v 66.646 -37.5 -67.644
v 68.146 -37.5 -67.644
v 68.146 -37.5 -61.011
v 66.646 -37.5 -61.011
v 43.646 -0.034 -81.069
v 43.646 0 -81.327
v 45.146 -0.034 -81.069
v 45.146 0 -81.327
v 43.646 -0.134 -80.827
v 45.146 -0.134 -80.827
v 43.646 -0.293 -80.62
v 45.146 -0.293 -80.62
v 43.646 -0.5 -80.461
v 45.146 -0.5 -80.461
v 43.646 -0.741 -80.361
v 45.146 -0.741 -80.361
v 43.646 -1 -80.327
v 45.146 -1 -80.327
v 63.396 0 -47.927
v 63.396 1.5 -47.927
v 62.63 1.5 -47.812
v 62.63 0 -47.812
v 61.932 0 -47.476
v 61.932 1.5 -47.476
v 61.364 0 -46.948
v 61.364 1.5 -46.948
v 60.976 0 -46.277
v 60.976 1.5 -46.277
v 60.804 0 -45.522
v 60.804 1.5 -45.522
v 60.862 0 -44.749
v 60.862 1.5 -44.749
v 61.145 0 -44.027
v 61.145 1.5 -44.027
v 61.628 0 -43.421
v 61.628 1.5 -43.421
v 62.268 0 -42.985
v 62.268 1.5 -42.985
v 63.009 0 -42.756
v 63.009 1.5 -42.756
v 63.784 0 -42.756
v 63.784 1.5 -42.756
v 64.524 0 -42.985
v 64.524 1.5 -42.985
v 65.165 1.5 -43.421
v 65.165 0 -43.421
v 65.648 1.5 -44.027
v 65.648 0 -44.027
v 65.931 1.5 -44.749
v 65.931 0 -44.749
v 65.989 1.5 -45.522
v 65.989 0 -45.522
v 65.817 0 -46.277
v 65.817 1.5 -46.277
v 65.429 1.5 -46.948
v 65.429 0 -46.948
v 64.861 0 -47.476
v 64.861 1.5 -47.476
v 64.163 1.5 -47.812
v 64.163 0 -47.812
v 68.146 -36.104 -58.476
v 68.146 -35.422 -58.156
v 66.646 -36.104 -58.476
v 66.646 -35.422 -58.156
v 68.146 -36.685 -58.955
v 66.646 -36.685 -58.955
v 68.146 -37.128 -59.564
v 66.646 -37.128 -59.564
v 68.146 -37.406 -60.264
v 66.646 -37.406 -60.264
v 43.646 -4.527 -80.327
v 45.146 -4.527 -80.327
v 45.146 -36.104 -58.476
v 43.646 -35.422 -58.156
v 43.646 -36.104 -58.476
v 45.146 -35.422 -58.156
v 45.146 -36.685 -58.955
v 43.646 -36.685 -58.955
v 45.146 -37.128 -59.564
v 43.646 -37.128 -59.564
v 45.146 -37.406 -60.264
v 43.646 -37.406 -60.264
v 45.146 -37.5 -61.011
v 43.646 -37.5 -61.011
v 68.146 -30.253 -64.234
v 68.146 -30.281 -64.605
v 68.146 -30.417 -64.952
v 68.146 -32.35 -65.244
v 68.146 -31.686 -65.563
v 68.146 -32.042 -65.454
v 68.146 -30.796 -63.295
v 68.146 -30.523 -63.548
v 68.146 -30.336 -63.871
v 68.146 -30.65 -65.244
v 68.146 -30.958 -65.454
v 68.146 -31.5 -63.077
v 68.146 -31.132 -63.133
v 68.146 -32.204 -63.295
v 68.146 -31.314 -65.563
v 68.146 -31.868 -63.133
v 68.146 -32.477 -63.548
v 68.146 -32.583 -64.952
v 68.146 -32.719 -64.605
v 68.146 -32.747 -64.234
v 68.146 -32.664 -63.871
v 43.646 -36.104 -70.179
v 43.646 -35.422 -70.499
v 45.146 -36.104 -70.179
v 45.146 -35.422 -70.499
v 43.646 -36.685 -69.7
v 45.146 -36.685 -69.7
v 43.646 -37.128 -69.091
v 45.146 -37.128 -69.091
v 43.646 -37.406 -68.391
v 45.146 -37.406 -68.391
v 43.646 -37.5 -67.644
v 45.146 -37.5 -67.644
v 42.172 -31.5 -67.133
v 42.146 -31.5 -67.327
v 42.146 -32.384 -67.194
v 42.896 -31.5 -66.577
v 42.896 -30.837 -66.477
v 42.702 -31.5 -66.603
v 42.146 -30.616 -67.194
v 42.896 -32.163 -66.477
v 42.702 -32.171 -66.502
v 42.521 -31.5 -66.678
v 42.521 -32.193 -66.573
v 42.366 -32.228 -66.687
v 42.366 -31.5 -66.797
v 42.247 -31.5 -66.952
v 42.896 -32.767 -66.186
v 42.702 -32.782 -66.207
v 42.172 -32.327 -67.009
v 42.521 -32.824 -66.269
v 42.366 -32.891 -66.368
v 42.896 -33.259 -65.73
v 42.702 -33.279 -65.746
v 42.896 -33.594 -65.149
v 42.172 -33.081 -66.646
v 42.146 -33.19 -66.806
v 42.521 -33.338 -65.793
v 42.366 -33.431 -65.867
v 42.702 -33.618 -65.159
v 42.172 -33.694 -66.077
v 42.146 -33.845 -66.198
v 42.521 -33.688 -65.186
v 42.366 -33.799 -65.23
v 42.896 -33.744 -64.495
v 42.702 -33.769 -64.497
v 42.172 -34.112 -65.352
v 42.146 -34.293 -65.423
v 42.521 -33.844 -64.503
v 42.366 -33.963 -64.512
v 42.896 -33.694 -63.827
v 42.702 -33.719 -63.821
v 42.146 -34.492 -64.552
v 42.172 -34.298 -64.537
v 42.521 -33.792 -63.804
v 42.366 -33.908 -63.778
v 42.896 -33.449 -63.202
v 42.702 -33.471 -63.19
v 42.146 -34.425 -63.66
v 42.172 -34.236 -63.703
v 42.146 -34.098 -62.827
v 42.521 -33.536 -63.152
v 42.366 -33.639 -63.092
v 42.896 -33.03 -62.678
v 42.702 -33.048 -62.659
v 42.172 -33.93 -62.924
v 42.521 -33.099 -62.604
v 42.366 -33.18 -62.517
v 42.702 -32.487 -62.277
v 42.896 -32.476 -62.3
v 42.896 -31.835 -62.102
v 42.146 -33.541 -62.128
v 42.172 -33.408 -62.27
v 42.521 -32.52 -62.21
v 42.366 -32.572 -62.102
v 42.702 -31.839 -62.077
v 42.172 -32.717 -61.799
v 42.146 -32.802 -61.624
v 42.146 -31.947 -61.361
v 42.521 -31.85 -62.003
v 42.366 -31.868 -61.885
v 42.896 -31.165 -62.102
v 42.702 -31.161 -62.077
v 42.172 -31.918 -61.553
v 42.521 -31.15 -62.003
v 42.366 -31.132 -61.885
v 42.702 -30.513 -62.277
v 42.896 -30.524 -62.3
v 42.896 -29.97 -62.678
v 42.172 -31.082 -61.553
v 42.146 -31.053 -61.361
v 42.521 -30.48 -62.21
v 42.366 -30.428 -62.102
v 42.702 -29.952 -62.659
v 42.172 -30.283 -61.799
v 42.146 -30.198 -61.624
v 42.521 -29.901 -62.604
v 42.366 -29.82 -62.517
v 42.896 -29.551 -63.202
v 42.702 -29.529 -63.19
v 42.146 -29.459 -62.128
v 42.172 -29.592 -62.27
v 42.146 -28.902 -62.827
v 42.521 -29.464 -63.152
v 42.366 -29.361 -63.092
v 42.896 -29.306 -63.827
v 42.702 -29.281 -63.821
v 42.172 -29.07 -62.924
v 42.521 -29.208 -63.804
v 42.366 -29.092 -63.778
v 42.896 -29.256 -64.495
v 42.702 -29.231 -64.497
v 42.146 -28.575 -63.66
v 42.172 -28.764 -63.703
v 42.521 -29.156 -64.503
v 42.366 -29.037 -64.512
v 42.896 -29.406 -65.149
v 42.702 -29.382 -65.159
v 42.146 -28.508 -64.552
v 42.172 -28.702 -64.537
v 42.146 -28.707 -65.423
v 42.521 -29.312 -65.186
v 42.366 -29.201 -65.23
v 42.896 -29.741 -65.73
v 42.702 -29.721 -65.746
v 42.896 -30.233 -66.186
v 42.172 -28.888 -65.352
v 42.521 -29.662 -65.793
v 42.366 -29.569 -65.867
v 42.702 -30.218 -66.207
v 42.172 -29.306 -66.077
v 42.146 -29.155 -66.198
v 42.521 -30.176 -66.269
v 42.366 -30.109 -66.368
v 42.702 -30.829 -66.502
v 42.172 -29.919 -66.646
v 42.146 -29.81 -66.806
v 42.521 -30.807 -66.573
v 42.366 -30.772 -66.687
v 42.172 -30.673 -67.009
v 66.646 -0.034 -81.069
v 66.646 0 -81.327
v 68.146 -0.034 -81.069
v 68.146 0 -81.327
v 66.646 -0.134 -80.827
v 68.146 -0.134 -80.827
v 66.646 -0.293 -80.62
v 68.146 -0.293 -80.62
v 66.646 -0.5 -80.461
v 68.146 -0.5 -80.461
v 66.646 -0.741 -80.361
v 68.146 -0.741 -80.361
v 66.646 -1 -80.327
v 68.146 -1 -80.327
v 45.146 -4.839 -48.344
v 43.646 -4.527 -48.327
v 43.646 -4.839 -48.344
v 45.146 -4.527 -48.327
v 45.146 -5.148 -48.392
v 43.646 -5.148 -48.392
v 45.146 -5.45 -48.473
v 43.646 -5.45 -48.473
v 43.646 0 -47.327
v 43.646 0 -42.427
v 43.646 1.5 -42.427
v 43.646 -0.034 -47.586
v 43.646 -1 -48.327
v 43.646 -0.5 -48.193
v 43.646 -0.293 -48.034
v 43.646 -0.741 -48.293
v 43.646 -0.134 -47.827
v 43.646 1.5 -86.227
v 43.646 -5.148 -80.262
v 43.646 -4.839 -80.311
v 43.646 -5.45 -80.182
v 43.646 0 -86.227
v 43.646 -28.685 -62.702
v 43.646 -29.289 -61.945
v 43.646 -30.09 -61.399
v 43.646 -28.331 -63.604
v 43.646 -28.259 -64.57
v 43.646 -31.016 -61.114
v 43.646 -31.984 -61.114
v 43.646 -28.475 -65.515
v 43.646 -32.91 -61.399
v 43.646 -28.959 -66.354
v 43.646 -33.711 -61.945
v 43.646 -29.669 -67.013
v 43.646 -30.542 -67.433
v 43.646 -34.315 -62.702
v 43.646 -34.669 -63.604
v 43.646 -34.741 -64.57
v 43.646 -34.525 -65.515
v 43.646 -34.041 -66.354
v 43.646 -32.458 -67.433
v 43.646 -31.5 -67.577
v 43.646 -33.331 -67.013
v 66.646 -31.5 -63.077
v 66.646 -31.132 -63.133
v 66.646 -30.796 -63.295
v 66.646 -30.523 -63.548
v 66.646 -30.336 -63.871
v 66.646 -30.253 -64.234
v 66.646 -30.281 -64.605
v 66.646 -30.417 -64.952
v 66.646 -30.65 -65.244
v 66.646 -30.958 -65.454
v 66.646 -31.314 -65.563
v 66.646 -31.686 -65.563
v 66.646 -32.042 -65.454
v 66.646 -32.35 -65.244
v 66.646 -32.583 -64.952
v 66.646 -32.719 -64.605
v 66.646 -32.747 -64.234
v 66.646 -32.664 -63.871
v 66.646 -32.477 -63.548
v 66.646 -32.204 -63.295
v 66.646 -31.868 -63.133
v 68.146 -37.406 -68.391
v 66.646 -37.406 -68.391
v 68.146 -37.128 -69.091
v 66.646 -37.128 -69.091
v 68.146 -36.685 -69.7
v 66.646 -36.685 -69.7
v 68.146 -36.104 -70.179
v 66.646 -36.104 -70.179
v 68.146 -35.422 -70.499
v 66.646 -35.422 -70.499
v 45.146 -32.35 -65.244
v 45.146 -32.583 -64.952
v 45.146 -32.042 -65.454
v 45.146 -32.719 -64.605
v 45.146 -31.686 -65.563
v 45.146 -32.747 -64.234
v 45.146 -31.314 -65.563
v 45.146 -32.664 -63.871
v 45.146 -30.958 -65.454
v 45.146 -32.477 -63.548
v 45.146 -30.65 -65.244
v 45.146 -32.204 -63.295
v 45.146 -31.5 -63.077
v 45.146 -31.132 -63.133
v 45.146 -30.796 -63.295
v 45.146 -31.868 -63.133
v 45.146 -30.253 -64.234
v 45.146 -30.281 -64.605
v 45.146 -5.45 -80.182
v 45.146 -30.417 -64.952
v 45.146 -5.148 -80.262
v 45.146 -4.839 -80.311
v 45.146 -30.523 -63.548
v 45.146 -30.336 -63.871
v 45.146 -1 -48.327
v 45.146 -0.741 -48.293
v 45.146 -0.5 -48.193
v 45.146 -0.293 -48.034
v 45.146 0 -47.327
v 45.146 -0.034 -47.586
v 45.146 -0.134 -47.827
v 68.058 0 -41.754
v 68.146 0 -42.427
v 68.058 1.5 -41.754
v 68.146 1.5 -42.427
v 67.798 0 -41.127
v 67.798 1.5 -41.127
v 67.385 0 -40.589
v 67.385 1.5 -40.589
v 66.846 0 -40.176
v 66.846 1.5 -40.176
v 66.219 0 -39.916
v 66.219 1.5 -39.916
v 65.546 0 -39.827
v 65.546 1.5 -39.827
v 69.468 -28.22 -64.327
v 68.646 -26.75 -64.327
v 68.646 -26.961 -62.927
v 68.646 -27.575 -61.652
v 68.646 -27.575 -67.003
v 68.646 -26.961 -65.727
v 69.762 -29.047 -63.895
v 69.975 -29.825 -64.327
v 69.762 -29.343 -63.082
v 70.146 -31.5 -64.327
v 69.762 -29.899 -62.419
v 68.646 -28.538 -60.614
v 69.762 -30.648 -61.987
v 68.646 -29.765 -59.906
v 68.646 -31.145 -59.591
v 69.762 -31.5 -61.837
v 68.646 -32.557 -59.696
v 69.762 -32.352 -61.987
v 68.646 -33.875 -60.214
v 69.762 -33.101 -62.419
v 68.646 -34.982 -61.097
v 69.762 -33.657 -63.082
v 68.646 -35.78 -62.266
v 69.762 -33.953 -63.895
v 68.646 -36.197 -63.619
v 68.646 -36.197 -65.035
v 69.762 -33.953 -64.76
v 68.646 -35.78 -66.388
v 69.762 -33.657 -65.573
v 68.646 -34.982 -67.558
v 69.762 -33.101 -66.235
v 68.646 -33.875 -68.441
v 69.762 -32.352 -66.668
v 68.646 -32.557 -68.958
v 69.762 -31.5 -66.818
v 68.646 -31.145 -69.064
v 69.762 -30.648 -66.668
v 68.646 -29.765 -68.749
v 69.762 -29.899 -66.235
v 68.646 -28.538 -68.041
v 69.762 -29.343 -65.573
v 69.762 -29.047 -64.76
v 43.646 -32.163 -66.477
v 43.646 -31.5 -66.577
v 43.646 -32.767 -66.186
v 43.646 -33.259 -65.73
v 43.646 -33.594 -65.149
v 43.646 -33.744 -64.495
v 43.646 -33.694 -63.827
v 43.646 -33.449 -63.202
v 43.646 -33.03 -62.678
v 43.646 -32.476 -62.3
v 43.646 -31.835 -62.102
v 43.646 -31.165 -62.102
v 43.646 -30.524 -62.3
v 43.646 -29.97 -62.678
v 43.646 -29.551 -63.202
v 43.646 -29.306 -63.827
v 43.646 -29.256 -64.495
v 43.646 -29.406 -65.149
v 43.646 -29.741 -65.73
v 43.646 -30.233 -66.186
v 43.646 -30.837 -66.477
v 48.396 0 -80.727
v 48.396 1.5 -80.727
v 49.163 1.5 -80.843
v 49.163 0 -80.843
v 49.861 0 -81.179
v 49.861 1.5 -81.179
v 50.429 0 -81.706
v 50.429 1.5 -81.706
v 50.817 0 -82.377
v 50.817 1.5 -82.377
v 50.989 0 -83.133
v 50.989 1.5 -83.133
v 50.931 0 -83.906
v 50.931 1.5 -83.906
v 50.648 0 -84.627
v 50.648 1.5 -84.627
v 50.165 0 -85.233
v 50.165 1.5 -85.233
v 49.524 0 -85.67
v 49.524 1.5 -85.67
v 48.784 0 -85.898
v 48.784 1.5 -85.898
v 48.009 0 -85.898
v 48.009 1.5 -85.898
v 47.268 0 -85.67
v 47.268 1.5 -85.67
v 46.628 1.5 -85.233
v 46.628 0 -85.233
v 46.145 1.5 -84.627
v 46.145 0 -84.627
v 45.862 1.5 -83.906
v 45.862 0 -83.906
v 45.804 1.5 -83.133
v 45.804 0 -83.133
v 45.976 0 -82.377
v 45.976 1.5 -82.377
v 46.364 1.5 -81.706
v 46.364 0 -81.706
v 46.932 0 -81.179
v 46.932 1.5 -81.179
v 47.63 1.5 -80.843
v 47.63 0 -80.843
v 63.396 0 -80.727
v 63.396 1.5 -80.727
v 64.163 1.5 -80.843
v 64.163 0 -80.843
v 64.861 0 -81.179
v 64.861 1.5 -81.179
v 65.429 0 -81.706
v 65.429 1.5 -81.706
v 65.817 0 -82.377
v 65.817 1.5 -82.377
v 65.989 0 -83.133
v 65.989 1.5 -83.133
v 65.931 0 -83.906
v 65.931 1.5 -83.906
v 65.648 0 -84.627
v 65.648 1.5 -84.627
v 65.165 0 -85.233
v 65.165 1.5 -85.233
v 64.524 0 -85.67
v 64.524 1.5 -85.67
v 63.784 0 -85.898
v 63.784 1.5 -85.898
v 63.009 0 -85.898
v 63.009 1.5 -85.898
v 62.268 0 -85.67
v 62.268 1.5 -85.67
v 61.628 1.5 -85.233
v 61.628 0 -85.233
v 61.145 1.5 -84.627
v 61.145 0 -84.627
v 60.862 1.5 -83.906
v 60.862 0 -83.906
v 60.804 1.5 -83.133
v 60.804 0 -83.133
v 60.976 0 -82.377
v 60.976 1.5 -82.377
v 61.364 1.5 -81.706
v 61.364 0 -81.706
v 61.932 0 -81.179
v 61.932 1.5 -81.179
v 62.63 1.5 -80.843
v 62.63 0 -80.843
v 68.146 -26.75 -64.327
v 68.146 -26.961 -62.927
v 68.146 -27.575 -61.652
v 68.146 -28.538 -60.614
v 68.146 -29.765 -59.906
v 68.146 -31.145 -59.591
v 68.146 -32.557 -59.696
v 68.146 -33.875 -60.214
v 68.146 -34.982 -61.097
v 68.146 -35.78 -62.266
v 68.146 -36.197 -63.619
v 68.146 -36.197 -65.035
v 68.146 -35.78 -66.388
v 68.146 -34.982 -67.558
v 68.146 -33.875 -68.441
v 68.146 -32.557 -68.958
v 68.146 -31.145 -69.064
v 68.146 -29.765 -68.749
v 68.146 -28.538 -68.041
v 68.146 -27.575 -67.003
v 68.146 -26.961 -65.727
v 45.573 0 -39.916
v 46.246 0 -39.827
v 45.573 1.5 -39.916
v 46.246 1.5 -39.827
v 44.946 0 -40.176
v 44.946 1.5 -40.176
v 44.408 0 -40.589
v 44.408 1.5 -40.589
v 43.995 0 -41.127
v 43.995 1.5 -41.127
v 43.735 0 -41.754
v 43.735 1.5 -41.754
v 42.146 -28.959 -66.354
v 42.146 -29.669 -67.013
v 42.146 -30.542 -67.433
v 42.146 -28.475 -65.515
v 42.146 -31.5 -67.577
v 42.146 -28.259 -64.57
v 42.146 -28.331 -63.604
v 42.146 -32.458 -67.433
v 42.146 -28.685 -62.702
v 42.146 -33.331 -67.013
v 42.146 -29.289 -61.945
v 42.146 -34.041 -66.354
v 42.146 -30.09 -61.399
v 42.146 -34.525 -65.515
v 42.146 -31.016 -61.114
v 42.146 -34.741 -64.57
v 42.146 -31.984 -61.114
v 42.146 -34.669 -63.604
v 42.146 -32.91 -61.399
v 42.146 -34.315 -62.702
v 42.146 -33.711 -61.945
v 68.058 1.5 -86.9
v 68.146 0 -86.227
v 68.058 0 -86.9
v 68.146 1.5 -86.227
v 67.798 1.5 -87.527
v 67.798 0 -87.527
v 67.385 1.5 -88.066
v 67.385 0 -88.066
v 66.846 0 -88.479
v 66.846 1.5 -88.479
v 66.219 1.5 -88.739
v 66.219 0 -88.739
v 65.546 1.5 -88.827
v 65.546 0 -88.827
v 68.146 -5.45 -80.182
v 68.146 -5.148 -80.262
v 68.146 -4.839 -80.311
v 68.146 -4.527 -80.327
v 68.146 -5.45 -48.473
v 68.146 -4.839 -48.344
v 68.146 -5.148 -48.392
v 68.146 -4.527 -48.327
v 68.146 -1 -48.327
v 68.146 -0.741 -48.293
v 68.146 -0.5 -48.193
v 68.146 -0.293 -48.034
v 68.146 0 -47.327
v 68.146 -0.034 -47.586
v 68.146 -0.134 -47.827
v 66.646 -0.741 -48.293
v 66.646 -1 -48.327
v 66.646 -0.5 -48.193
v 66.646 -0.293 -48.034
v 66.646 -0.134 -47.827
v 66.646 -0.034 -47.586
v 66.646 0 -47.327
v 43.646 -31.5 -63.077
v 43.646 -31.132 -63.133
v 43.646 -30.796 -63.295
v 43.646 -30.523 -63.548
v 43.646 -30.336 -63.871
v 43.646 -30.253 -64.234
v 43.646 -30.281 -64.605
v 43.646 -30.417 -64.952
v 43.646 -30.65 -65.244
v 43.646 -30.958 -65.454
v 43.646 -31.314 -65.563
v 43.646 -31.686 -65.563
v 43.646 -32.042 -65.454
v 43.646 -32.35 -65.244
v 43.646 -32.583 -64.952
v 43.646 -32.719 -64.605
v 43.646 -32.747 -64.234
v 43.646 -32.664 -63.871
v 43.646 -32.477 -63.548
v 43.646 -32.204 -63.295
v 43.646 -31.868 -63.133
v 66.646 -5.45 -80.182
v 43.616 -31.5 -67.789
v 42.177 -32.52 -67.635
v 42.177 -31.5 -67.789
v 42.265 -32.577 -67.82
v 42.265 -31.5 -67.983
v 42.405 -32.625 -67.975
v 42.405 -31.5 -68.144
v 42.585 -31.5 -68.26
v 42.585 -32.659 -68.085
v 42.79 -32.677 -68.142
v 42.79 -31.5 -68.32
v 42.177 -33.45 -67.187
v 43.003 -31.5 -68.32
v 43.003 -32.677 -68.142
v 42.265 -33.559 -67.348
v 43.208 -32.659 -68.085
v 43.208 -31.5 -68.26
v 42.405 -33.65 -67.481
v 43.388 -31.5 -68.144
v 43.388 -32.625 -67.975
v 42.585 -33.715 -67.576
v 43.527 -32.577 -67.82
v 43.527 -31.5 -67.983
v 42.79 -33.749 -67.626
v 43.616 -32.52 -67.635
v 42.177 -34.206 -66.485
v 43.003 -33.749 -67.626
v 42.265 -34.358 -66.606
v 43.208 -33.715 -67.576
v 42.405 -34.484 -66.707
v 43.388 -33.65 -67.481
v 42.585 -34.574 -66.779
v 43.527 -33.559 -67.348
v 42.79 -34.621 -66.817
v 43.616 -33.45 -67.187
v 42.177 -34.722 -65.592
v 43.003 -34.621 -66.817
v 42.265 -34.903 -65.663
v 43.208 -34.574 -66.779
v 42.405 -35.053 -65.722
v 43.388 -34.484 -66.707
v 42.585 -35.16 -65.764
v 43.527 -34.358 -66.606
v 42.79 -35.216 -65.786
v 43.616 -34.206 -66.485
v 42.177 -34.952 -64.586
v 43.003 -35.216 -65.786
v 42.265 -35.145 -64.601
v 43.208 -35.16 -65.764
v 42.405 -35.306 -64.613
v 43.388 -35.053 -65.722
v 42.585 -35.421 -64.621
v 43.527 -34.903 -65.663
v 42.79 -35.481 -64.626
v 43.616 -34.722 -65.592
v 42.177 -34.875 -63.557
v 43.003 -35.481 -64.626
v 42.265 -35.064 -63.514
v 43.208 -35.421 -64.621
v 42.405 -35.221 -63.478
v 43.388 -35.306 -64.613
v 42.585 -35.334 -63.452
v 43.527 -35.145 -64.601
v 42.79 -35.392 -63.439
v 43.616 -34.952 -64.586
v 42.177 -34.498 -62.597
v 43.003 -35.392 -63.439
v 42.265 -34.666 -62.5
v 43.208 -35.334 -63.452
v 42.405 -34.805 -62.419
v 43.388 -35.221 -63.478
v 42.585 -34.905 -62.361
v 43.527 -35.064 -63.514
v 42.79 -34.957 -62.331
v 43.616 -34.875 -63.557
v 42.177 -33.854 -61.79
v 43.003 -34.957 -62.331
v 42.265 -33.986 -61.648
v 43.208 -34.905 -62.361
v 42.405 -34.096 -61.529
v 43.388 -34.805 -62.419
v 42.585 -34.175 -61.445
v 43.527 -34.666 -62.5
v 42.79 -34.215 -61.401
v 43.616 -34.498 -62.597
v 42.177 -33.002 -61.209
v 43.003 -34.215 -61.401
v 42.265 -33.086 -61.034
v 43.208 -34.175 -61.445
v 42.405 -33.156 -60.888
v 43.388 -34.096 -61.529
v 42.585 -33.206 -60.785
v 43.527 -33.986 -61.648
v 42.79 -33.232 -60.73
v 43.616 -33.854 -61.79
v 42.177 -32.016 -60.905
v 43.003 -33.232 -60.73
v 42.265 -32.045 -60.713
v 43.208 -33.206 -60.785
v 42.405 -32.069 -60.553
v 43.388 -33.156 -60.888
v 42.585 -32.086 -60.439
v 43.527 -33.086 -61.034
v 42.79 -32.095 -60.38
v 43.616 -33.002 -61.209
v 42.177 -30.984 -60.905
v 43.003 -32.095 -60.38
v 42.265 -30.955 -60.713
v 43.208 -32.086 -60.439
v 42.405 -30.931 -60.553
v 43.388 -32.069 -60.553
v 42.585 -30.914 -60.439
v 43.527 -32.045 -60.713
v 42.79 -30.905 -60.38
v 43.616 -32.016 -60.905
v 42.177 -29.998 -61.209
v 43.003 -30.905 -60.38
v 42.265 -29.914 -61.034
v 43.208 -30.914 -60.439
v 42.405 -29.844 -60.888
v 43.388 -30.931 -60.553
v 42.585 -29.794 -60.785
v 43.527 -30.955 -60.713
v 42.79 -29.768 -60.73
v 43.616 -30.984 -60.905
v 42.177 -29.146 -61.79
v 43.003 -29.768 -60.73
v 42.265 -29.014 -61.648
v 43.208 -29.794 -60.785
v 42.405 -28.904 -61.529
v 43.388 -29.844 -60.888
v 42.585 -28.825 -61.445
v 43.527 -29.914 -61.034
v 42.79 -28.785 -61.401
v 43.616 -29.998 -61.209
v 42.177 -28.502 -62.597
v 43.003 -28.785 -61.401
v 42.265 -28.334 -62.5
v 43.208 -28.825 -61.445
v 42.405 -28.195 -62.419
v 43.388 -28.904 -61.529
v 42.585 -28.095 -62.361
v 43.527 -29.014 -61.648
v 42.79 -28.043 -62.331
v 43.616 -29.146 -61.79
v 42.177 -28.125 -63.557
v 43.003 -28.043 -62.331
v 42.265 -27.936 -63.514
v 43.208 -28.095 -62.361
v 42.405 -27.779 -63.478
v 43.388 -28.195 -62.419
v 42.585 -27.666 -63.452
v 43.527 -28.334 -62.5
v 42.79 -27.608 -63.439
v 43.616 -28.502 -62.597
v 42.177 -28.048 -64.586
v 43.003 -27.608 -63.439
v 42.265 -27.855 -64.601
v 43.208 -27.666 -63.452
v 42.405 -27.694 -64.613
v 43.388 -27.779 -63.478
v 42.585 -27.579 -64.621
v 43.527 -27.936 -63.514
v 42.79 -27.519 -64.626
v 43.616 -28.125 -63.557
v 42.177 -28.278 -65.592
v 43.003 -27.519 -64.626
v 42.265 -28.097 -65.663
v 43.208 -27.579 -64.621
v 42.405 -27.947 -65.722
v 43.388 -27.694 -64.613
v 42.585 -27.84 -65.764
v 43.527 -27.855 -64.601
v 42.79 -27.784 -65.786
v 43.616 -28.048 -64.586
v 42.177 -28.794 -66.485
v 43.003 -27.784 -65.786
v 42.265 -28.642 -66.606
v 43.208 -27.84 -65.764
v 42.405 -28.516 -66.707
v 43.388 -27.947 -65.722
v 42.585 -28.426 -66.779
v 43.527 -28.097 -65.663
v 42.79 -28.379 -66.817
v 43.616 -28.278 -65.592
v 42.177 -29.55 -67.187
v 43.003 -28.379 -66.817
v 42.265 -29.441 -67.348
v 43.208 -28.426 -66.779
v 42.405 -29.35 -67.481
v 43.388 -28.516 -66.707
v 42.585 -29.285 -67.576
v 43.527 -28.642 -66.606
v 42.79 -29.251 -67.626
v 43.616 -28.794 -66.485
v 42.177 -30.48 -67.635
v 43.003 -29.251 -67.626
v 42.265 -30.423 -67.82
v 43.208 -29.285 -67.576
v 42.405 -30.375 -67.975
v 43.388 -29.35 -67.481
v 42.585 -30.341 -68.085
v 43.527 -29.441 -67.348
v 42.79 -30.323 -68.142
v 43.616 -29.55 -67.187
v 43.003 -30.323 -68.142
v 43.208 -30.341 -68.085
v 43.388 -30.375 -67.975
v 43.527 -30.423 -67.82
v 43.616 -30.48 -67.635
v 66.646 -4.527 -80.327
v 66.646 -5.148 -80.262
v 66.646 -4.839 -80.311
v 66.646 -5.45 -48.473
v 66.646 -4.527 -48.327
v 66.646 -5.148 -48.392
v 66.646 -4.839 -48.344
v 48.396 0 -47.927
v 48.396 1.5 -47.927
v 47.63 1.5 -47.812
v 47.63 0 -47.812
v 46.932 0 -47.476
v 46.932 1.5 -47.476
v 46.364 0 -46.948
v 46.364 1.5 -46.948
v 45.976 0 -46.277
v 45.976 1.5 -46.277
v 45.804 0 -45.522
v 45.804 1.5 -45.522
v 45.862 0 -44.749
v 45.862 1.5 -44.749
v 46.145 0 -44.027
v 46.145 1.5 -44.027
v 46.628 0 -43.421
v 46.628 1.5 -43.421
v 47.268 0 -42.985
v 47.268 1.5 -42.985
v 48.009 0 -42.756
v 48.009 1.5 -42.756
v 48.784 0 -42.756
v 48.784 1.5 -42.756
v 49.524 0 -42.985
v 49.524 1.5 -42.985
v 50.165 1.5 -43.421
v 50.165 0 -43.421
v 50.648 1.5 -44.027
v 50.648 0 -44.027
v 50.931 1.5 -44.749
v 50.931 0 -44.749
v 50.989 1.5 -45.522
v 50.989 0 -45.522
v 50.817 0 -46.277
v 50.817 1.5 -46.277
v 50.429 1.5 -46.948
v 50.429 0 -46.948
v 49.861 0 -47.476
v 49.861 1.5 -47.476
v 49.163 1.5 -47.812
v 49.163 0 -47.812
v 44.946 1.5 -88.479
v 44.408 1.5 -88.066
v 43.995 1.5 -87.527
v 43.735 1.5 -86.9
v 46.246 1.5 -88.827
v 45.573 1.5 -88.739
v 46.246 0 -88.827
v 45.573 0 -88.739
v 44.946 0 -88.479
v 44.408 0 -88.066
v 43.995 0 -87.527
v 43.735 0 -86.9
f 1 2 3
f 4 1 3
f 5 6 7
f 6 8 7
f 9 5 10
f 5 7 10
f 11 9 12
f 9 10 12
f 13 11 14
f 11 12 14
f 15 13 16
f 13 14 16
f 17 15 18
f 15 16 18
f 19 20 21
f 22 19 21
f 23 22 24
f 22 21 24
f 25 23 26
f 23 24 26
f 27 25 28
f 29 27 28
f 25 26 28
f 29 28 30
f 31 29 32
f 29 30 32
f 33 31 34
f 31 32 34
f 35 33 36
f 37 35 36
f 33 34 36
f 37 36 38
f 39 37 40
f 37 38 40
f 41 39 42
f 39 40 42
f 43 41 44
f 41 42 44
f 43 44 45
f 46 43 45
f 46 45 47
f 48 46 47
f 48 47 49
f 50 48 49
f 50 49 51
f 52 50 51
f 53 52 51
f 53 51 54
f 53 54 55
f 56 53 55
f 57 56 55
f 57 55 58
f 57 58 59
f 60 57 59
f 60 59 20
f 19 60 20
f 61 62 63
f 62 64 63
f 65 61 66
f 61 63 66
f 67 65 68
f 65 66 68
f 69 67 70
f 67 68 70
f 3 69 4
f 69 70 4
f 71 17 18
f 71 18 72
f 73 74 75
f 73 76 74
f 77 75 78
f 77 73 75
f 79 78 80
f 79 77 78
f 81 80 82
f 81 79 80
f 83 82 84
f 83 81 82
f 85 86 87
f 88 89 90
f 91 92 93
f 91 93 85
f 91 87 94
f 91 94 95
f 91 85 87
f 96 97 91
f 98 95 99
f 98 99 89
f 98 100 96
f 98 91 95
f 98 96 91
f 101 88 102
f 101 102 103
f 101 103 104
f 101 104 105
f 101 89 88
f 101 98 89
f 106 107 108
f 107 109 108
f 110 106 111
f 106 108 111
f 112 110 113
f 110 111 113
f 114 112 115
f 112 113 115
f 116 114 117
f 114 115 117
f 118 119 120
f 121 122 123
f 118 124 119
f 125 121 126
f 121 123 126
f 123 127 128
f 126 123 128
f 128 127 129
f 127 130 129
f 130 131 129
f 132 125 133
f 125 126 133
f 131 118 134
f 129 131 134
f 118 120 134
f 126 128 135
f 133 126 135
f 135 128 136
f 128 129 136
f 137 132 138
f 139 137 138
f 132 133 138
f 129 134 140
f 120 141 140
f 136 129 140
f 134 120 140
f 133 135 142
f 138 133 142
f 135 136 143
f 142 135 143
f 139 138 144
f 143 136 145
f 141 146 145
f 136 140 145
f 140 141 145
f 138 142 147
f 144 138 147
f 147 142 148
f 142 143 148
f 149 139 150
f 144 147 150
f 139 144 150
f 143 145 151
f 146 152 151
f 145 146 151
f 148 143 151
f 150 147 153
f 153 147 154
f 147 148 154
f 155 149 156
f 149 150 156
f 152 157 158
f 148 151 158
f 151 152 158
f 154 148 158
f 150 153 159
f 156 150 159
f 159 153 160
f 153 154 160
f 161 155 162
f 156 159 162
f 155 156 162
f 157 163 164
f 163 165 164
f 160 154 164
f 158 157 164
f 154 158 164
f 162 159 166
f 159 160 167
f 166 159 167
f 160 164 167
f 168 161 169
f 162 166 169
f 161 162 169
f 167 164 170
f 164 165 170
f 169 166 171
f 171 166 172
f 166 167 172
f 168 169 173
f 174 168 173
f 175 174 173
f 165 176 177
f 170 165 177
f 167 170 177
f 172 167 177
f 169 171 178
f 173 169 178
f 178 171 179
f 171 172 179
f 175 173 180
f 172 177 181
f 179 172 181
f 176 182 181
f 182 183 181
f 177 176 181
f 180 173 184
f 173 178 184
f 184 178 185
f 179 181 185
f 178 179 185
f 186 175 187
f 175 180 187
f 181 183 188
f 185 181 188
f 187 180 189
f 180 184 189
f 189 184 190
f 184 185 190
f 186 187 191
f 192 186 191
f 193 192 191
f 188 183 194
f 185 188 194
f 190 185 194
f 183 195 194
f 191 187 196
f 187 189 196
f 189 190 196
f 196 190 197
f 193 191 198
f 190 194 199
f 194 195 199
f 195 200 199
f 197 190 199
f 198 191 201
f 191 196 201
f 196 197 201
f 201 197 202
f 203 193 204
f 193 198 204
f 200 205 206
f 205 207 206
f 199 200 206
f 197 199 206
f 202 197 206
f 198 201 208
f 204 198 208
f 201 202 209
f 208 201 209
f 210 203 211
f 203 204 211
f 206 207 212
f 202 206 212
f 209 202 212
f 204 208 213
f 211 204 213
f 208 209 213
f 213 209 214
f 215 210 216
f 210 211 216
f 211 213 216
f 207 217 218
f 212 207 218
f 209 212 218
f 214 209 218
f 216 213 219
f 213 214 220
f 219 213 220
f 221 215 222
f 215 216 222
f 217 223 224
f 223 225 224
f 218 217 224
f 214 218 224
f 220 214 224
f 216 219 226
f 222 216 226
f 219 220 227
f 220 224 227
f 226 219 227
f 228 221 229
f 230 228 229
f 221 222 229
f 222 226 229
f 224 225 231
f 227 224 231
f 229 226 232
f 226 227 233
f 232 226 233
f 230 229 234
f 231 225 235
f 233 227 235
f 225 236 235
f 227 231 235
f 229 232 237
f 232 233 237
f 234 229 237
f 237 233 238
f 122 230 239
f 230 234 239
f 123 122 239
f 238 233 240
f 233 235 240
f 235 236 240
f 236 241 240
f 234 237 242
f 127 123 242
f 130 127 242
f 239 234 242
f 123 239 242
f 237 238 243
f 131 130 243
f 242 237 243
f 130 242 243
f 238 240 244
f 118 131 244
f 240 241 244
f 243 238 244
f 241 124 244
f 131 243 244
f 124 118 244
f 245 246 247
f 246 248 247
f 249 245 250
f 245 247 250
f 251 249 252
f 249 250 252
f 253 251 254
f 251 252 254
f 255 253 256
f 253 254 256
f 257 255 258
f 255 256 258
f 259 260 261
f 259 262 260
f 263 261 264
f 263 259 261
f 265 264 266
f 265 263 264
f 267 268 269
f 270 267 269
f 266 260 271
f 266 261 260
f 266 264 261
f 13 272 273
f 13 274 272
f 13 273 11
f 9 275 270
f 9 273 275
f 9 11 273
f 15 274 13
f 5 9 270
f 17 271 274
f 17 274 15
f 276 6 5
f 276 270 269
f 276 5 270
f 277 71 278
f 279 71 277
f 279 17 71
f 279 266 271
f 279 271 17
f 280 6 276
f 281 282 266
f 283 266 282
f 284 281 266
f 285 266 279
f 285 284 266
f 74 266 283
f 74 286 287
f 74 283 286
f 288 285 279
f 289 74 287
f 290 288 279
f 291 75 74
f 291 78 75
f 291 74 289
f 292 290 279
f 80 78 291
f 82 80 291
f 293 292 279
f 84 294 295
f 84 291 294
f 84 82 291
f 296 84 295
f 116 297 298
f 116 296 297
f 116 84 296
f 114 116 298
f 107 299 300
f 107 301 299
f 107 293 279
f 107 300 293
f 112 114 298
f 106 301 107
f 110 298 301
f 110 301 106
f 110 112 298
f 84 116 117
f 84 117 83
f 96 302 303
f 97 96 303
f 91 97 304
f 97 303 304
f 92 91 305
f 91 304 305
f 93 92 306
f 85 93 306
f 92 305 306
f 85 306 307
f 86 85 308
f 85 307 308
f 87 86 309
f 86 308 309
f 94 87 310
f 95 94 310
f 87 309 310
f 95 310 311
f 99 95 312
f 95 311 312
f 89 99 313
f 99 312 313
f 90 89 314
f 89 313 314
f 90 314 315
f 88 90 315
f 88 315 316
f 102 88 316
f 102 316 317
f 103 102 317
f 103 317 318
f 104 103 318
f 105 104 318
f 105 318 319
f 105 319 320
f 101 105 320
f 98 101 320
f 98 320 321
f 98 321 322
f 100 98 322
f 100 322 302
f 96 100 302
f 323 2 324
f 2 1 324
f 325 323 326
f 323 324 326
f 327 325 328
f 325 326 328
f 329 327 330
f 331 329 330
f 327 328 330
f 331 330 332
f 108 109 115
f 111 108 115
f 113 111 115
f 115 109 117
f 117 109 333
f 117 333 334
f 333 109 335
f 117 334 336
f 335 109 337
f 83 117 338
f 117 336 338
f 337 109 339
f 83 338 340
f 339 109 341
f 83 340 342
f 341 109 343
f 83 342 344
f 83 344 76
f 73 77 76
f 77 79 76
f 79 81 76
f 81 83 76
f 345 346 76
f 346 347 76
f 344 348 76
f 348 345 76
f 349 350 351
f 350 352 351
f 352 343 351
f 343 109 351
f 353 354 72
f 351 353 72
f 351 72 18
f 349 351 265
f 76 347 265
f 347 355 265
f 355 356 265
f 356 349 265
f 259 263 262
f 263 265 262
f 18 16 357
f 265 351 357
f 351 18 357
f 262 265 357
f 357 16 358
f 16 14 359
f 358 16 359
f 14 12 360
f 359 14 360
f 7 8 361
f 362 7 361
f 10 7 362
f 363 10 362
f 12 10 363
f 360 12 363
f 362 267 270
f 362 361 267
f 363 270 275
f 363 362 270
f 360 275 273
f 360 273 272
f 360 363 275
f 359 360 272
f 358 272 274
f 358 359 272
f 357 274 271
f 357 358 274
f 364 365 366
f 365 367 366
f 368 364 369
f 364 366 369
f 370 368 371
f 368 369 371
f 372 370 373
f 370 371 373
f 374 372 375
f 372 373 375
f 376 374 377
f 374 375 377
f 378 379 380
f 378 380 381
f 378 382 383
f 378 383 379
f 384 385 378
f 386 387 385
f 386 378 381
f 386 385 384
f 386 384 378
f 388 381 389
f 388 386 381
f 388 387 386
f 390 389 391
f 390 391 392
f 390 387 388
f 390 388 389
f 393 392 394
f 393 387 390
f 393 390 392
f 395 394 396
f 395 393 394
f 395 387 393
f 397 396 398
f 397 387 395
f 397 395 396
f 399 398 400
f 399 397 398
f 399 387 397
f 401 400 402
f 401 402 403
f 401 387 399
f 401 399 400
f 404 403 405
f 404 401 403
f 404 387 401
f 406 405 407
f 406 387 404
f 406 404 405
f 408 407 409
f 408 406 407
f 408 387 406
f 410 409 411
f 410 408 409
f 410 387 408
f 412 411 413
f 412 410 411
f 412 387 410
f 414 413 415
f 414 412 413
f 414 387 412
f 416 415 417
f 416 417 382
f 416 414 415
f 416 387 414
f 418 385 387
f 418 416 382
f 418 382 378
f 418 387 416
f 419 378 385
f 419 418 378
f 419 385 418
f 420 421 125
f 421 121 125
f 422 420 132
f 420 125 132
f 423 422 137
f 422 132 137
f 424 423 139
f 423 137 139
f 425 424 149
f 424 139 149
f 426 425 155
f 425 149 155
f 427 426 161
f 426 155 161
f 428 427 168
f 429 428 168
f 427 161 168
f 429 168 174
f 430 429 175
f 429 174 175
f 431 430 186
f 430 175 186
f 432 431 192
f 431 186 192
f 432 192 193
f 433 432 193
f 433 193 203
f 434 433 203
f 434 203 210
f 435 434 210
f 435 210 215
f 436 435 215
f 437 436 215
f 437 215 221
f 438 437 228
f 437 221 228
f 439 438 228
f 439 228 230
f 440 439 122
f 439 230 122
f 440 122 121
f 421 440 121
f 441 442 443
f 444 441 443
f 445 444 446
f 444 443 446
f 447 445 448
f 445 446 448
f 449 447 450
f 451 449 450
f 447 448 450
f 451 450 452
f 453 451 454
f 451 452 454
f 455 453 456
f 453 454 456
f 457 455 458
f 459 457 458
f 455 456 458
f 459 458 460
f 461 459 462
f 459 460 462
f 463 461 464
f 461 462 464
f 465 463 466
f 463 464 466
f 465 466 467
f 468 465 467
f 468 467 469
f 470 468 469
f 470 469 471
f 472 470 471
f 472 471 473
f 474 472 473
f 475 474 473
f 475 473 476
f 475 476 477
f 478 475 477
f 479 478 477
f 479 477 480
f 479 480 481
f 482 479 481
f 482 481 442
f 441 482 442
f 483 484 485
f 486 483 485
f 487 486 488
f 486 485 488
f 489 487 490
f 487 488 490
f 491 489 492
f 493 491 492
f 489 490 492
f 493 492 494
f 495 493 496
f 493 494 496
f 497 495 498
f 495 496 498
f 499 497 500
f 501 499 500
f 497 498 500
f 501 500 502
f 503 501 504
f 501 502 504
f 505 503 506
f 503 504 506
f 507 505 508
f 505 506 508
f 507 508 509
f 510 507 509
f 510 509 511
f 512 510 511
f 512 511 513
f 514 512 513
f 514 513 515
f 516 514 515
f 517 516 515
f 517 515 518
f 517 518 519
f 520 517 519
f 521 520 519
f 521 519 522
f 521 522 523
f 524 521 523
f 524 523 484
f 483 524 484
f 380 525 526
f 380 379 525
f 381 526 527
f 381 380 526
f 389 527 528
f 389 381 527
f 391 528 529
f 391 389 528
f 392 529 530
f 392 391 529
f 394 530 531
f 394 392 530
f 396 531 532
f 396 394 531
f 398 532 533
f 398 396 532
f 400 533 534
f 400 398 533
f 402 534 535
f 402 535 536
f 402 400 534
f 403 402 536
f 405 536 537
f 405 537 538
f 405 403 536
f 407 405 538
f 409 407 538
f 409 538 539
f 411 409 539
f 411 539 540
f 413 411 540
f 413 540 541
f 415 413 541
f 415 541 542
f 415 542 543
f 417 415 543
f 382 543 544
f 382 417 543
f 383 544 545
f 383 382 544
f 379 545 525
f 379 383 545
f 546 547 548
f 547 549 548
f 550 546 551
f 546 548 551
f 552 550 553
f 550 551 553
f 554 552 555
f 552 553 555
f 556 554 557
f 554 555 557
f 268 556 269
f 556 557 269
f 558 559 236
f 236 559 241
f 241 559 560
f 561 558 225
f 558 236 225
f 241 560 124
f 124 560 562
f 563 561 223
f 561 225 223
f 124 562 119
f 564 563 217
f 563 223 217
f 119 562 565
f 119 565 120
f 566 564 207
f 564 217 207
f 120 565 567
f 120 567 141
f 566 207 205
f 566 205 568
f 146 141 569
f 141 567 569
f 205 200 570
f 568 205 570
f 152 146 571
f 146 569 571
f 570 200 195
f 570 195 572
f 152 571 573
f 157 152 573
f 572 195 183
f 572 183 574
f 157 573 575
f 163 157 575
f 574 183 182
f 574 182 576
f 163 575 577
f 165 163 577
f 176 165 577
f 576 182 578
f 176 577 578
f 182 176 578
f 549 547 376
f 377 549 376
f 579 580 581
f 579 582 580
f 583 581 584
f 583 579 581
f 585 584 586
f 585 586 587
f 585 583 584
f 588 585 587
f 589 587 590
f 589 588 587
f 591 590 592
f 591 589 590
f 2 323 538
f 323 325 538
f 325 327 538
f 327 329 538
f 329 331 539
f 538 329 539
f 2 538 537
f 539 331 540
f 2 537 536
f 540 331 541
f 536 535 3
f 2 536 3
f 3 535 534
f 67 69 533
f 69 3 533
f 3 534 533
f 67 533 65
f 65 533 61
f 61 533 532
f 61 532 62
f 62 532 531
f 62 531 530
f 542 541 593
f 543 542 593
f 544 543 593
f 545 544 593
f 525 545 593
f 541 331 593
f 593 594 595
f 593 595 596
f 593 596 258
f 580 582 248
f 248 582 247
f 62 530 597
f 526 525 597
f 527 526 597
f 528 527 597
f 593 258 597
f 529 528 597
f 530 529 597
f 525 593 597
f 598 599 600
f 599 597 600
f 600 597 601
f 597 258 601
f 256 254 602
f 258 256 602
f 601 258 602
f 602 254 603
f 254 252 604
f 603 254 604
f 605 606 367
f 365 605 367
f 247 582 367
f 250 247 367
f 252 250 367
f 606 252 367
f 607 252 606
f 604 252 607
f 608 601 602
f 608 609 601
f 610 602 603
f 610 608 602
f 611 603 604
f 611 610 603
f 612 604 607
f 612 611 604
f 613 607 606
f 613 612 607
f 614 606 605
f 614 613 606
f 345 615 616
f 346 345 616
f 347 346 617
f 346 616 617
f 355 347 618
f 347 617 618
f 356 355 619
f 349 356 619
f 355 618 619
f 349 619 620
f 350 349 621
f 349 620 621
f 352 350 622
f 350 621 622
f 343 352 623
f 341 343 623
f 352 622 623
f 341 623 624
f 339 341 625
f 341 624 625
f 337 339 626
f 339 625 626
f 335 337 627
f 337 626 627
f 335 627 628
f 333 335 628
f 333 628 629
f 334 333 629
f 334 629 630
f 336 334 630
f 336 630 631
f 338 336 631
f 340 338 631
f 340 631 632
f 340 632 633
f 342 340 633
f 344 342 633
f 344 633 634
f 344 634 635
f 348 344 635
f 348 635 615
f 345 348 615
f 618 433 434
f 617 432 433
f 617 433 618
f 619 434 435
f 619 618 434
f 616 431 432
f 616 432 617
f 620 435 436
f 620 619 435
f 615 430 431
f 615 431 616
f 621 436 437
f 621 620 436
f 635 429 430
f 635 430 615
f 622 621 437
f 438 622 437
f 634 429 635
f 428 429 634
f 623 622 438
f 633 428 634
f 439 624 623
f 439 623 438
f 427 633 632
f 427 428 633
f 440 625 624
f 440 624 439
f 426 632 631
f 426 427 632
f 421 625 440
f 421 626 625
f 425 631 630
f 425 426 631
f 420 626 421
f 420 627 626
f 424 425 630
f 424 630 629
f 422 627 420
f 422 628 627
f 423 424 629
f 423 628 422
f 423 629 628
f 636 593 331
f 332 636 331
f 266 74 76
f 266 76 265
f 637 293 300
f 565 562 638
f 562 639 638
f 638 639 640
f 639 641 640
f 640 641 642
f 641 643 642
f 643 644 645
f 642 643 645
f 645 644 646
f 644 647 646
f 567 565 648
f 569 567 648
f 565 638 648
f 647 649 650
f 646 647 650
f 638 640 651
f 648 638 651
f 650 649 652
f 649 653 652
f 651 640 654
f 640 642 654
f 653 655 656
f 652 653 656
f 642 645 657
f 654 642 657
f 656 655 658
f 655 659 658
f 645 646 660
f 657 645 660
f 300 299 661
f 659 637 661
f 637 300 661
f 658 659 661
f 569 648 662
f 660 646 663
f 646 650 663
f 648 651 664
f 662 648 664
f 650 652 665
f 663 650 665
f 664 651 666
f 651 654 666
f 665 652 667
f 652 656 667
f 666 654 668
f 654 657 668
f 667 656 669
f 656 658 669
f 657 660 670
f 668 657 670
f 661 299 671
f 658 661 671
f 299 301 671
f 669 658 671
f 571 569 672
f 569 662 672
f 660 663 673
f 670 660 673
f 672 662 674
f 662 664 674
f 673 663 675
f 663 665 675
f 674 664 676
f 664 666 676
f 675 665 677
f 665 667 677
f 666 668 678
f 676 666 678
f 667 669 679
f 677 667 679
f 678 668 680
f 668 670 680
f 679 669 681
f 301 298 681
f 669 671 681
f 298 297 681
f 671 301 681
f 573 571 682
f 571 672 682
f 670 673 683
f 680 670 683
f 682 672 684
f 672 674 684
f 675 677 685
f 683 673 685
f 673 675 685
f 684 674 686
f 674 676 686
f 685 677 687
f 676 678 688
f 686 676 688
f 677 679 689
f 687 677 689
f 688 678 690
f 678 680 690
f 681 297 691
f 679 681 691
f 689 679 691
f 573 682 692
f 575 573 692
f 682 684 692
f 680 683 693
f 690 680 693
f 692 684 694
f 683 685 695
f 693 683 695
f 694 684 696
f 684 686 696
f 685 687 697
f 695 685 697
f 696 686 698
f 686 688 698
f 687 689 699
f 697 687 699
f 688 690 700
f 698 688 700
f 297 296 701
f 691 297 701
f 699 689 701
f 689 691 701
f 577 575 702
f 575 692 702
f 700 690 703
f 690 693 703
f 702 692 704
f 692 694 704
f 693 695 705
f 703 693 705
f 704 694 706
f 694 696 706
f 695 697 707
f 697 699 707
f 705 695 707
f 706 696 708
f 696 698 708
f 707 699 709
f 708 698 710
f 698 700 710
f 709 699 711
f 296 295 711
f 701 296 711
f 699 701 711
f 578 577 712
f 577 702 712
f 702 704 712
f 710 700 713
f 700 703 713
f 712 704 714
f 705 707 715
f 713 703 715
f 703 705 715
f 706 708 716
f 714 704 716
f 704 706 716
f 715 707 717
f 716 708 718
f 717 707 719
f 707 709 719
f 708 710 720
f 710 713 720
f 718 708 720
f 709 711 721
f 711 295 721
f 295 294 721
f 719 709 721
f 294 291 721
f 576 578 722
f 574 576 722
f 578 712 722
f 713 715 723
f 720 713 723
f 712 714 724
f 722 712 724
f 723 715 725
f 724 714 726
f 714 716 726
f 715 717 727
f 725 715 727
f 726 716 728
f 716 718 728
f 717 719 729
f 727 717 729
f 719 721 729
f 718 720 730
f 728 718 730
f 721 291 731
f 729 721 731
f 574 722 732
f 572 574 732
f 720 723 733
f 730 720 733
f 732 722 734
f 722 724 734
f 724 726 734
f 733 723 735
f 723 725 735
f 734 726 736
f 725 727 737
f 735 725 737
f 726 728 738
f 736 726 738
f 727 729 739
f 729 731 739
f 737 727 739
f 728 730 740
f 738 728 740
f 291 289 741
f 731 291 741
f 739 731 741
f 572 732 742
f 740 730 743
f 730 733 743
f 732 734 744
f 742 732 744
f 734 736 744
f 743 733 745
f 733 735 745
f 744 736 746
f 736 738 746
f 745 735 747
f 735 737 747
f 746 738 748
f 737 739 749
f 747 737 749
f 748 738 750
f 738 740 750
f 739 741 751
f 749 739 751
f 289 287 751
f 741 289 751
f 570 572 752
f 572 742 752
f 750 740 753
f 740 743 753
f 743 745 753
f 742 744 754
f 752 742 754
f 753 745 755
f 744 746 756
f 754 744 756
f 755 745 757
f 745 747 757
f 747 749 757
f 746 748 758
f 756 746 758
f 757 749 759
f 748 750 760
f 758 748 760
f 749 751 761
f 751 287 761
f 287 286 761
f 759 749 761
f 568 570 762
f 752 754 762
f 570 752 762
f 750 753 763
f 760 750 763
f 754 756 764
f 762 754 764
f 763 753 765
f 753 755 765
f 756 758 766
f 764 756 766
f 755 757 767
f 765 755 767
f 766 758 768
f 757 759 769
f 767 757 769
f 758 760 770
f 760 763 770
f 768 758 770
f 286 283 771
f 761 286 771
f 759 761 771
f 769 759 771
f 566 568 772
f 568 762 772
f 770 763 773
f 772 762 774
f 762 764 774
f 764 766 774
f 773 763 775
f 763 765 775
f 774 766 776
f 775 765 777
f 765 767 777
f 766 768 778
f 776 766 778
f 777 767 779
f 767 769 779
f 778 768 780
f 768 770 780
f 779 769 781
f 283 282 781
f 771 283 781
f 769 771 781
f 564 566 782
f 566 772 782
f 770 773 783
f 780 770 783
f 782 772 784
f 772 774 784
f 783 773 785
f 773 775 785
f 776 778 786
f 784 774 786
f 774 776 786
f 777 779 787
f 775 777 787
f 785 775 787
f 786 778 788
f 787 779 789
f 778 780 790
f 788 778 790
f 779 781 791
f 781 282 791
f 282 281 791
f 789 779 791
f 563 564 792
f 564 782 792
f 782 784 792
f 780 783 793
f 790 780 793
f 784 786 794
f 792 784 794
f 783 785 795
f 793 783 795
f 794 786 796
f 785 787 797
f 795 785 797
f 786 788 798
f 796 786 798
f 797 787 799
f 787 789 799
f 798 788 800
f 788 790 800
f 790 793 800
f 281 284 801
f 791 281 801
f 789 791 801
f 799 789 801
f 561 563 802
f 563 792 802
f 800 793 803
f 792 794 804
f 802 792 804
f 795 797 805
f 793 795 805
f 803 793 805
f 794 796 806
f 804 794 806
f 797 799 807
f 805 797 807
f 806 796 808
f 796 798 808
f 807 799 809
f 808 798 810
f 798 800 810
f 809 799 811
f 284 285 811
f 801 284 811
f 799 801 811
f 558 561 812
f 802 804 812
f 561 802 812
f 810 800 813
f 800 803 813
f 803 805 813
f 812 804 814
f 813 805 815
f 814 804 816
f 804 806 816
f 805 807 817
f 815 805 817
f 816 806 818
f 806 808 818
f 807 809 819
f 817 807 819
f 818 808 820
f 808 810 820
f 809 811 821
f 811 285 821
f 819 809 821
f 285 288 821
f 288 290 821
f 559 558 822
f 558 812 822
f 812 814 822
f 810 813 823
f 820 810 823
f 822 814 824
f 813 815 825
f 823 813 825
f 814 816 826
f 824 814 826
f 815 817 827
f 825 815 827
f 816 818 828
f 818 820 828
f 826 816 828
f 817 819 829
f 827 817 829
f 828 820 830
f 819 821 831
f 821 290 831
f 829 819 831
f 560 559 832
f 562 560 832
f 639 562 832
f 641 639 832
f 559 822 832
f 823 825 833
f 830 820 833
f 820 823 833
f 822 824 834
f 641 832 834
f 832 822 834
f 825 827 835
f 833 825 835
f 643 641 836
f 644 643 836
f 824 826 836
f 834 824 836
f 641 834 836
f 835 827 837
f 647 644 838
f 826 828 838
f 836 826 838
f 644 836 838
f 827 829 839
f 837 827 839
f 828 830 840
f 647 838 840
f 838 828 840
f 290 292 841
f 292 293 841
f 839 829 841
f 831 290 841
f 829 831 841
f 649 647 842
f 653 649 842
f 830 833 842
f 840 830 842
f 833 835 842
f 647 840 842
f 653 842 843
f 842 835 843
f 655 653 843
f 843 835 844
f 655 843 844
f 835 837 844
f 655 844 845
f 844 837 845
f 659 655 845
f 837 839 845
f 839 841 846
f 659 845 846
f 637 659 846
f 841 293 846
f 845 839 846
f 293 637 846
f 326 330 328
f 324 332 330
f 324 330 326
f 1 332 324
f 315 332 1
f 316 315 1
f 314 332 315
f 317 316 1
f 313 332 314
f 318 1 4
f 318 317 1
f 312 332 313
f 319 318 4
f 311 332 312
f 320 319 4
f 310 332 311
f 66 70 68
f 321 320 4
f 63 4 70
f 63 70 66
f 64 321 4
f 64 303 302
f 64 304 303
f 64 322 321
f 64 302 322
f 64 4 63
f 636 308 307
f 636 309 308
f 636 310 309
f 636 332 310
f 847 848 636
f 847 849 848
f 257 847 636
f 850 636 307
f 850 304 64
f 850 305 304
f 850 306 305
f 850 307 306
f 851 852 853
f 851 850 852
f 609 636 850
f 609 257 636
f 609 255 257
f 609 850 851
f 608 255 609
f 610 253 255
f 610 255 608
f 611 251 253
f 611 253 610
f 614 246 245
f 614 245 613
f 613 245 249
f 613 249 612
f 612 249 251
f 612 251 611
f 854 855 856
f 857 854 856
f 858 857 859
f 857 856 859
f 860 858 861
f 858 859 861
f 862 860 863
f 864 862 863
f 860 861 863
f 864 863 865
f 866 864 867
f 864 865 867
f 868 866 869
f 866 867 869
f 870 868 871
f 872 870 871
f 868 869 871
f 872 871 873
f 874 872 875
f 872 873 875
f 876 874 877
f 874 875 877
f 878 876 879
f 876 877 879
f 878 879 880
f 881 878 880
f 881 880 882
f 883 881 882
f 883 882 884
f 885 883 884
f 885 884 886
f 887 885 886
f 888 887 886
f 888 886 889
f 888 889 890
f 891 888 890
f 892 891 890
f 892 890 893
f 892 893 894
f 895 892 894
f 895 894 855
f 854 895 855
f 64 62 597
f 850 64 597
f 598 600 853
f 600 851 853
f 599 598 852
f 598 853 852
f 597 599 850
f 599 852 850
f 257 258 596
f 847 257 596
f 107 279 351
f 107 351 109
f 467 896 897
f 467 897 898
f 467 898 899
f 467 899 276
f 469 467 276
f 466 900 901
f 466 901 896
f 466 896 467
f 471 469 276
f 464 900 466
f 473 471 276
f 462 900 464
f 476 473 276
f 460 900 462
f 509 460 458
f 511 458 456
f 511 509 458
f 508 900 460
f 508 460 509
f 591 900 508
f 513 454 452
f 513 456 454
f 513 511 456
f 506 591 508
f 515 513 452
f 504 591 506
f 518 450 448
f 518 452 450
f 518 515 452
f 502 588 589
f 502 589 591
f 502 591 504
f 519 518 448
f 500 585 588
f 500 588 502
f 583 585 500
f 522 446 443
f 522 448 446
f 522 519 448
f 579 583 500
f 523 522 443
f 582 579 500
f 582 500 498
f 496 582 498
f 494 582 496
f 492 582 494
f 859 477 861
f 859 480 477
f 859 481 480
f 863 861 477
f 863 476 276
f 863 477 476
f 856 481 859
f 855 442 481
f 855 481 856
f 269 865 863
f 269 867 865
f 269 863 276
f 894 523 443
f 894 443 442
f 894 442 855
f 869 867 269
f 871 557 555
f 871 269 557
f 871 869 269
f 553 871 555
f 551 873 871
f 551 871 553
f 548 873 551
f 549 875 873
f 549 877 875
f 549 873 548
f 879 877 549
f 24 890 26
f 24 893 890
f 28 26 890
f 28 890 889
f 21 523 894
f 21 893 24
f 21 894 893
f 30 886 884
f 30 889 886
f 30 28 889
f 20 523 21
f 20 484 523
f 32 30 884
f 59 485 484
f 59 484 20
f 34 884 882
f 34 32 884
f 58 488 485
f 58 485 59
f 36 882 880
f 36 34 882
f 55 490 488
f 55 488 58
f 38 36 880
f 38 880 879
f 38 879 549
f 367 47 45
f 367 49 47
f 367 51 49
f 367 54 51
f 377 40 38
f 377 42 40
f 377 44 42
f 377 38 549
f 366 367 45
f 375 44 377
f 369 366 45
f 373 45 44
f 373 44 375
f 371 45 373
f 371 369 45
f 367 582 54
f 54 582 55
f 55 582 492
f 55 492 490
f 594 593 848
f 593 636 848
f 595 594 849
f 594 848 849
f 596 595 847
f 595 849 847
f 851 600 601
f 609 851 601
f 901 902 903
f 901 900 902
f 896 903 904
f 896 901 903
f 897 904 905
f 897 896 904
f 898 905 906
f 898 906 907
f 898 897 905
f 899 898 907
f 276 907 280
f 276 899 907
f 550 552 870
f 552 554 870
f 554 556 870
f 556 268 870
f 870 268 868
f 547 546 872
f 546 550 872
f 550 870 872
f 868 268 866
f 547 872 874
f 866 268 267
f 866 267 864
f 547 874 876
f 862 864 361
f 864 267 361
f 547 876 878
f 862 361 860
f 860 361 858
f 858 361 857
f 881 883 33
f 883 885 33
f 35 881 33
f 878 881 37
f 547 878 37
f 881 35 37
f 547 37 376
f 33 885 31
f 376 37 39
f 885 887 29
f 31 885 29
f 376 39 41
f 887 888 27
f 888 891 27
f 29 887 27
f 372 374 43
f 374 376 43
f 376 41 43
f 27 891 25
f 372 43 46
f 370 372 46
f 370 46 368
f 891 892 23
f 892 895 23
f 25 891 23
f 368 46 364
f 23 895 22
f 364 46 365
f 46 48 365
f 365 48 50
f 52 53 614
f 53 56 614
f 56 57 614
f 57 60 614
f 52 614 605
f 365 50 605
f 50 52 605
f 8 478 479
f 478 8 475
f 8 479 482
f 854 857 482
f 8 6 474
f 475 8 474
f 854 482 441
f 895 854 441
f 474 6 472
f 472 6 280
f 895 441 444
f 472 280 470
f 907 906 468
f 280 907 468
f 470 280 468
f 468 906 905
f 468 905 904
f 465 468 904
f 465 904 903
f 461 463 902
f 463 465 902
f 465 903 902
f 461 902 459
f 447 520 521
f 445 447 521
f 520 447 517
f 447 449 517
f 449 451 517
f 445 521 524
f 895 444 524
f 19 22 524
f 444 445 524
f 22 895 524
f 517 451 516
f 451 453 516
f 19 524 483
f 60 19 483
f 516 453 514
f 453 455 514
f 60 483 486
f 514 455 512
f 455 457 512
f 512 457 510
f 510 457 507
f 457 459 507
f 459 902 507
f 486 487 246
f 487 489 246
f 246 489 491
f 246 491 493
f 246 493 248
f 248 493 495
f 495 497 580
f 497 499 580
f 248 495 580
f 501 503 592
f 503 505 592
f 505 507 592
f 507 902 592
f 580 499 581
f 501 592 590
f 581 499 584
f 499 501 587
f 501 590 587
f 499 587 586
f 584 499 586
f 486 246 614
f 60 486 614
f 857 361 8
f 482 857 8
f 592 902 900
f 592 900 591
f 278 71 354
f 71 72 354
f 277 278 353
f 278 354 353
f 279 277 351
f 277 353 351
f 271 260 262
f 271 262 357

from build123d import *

# Parameters (mm, degrees)
SKETCH_1_W          = 24.5
SKETCH_1_H          = 49
EXTRUDE_1_DEPTH     = 1.5
EXTRUDE_2_DEPTH     = 1.5
EXTRUDE_3_DEPTH     = 1.5
SKETCH_5_R          = 2.6
CUT_EXTRUDE_1_DEPTH = 119.55472929
FILLET_1_R          = 2.6
SKETCH_6_R          = 1.25
CUT_EXTRUDE_2_DEPTH = 100.482631552
FILLET_2_R          = 3
FILLET_3_R          = 1


with BuildPart() as part:
    # 草图1 → 凸台-拉伸1 (new body)
    with BuildSketch(Plane(origin=(0, 0, 0), x_dir=(1, 0, 0), z_dir=(0, 1, 0))):
        with Locations((55.896385498, 64.327326767)):
            Rectangle(SKETCH_1_W, SKETCH_1_H)
    extrude(amount=EXTRUDE_1_DEPTH)

    # 草图2 → 凸台-拉伸2 (add)
    with BuildSketch(Plane(origin=(68.146385498, 0, 0), x_dir=(0, 0, -1), z_dir=(1, 0, 0))):
        Polygon((69.827326767, -37.5), (58.827326767, -37.5), (48.327326767, -5), (48.327326767, 1.5), (64.327326767, 1.5), (80.327326767, 1.5), (80.327326767, -5), align=None)
    extrude(amount=-EXTRUDE_2_DEPTH)

    # 草图4 → 凸台-拉伸3 (add)
    with BuildSketch(Plane.ZY.offset(-43.646385498)):
        Polygon((-48.327326767, -5), (-48.327326767, 0), (-80.327326767, 0), (-80.327326767, -5), (-69.827326767, -37.5), (-58.827326767, -37.5), align=None)
    extrude(amount=-EXTRUDE_3_DEPTH)

    # 草图5 → 切除-拉伸1 (cut, through all)
    with BuildSketch(Plane(origin=(0, 1.5, 0), x_dir=(1, 0, 0), z_dir=(0, 1, 0))):
        with Locations(Location((48.396385498, 83.327326767, 0), (0, 0, 270))):
            Circle(SKETCH_5_R)
        with Locations(Location((63.396385498, 83.327326767, 0), (0, 0, 270))):
            Circle(SKETCH_5_R)
        with Locations(Location((63.396385498, 45.327326767, 0), (0, 0, 90))):
            Circle(SKETCH_5_R)
        with Locations(Location((48.396385498, 45.327326767, 0), (0, 0, 90))):
            Circle(SKETCH_5_R)
    extrude(amount=-CUT_EXTRUDE_1_DEPTH, mode=Mode.SUBTRACT)

    # 圆角1
    fillet_1_edges = [part.edges().sort_by_distance(p)[0] for p in [
        (43.646385498, 0.75, -39.827326767),
        (43.646385498, 0.75, -88.827326767),
        (68.146385498, 0.75, -88.827326767),
        (68.146385498, 0.75, -39.827326767),
    ]]
    fillet(fillet_1_edges, radius=FILLET_1_R)

    # 草图6 → 切除-拉伸2 (cut, through all)
    with BuildSketch(Plane.ZY.offset(-43.646385498)):
        with Locations((-64.327326767, -31.5)):
            Circle(SKETCH_6_R)
    extrude(amount=-CUT_EXTRUDE_2_DEPTH, mode=Mode.SUBTRACT)

    # 圆角2
    fillet_2_edges = [part.edges().sort_by_distance(p)[0] for p in [
        (67.396385498, -5, -80.327326767),
        (67.396385498, -37.5, -69.827326767),
        (67.396385498, -37.5, -58.827326767),
        (67.396385498, -5, -48.327326767),
        (44.396385498, -5, -48.327326767),
        (44.396385498, -37.5, -58.827326767),
        (44.396385498, -37.5, -69.827326767),
        (44.396385498, -5, -80.327326767),
    ]]
    fillet(fillet_2_edges, radius=FILLET_2_R)

    # 圆角3
    fillet_3_edges = [part.edges().sort_by_distance(p)[0] for p in [
        (67.396385498, 0, -48.327326767),
        (67.396385498, 0, -80.327326767),
        (44.396385498, 0, -80.327326767),
        (44.396385498, 0, -48.327326767),
    ]]
    fillet(fillet_3_edges, radius=FILLET_3_R)

    # 草图9 → 旋转1 (revolve)
    with BuildSketch(Plane(origin=(0, 0, -64.327326767), x_dir=(-1, 0, 0), z_dir=(0, 0, 1))):
        with BuildLine():
            Line((-68.146385498, 31.5), (-68.146385498, 26.75))
            Line((-68.146385498, 26.75), (-68.646385498, 26.75))
            ThreePointArc((-68.646385498, 26.75), (-69.762475458, 29.009392644), (-70.146385498, 31.5))
            Line((-70.146385498, 31.5), (-68.146385498, 31.5))
        make_face()
    revolve(axis=Axis((68.146385498, -31.5, -64.327326767), (1, 0, 0)))

    # 草图10 → 旋转2 (revolve)
    with BuildSketch(Plane(origin=(0, 0, -64.327326767), x_dir=(-1, 0, 0), z_dir=(0, 0, 1)), mode=Mode.PRIVATE) as revolve_2_sk:
        with BuildLine():
            Line((-42.146385498, 28.5), (-42.146385498, 28.25))
            ThreePointArc((-42.146385498, 28.25), (-42.896385498, 27.5), (-43.646385498, 28.25))
            Line((-43.646385498, 28.25), (-43.646385498, 29.25))
            Line((-43.646385498, 29.25), (-42.896385498, 29.25))
            ThreePointArc((-42.896385498, 29.25), (-42.366055412, 29.030330086), (-42.146385498, 28.5))
        make_face()
    revolve(revolve_2_sk.sketch.rotate(Axis((68.146385498, -31.5, -64.327326767), (-1, 0, 0)), 90), axis=Axis((68.146385498, -31.5, -64.327326767), (-1, 0, 0)))


solid = part.part
